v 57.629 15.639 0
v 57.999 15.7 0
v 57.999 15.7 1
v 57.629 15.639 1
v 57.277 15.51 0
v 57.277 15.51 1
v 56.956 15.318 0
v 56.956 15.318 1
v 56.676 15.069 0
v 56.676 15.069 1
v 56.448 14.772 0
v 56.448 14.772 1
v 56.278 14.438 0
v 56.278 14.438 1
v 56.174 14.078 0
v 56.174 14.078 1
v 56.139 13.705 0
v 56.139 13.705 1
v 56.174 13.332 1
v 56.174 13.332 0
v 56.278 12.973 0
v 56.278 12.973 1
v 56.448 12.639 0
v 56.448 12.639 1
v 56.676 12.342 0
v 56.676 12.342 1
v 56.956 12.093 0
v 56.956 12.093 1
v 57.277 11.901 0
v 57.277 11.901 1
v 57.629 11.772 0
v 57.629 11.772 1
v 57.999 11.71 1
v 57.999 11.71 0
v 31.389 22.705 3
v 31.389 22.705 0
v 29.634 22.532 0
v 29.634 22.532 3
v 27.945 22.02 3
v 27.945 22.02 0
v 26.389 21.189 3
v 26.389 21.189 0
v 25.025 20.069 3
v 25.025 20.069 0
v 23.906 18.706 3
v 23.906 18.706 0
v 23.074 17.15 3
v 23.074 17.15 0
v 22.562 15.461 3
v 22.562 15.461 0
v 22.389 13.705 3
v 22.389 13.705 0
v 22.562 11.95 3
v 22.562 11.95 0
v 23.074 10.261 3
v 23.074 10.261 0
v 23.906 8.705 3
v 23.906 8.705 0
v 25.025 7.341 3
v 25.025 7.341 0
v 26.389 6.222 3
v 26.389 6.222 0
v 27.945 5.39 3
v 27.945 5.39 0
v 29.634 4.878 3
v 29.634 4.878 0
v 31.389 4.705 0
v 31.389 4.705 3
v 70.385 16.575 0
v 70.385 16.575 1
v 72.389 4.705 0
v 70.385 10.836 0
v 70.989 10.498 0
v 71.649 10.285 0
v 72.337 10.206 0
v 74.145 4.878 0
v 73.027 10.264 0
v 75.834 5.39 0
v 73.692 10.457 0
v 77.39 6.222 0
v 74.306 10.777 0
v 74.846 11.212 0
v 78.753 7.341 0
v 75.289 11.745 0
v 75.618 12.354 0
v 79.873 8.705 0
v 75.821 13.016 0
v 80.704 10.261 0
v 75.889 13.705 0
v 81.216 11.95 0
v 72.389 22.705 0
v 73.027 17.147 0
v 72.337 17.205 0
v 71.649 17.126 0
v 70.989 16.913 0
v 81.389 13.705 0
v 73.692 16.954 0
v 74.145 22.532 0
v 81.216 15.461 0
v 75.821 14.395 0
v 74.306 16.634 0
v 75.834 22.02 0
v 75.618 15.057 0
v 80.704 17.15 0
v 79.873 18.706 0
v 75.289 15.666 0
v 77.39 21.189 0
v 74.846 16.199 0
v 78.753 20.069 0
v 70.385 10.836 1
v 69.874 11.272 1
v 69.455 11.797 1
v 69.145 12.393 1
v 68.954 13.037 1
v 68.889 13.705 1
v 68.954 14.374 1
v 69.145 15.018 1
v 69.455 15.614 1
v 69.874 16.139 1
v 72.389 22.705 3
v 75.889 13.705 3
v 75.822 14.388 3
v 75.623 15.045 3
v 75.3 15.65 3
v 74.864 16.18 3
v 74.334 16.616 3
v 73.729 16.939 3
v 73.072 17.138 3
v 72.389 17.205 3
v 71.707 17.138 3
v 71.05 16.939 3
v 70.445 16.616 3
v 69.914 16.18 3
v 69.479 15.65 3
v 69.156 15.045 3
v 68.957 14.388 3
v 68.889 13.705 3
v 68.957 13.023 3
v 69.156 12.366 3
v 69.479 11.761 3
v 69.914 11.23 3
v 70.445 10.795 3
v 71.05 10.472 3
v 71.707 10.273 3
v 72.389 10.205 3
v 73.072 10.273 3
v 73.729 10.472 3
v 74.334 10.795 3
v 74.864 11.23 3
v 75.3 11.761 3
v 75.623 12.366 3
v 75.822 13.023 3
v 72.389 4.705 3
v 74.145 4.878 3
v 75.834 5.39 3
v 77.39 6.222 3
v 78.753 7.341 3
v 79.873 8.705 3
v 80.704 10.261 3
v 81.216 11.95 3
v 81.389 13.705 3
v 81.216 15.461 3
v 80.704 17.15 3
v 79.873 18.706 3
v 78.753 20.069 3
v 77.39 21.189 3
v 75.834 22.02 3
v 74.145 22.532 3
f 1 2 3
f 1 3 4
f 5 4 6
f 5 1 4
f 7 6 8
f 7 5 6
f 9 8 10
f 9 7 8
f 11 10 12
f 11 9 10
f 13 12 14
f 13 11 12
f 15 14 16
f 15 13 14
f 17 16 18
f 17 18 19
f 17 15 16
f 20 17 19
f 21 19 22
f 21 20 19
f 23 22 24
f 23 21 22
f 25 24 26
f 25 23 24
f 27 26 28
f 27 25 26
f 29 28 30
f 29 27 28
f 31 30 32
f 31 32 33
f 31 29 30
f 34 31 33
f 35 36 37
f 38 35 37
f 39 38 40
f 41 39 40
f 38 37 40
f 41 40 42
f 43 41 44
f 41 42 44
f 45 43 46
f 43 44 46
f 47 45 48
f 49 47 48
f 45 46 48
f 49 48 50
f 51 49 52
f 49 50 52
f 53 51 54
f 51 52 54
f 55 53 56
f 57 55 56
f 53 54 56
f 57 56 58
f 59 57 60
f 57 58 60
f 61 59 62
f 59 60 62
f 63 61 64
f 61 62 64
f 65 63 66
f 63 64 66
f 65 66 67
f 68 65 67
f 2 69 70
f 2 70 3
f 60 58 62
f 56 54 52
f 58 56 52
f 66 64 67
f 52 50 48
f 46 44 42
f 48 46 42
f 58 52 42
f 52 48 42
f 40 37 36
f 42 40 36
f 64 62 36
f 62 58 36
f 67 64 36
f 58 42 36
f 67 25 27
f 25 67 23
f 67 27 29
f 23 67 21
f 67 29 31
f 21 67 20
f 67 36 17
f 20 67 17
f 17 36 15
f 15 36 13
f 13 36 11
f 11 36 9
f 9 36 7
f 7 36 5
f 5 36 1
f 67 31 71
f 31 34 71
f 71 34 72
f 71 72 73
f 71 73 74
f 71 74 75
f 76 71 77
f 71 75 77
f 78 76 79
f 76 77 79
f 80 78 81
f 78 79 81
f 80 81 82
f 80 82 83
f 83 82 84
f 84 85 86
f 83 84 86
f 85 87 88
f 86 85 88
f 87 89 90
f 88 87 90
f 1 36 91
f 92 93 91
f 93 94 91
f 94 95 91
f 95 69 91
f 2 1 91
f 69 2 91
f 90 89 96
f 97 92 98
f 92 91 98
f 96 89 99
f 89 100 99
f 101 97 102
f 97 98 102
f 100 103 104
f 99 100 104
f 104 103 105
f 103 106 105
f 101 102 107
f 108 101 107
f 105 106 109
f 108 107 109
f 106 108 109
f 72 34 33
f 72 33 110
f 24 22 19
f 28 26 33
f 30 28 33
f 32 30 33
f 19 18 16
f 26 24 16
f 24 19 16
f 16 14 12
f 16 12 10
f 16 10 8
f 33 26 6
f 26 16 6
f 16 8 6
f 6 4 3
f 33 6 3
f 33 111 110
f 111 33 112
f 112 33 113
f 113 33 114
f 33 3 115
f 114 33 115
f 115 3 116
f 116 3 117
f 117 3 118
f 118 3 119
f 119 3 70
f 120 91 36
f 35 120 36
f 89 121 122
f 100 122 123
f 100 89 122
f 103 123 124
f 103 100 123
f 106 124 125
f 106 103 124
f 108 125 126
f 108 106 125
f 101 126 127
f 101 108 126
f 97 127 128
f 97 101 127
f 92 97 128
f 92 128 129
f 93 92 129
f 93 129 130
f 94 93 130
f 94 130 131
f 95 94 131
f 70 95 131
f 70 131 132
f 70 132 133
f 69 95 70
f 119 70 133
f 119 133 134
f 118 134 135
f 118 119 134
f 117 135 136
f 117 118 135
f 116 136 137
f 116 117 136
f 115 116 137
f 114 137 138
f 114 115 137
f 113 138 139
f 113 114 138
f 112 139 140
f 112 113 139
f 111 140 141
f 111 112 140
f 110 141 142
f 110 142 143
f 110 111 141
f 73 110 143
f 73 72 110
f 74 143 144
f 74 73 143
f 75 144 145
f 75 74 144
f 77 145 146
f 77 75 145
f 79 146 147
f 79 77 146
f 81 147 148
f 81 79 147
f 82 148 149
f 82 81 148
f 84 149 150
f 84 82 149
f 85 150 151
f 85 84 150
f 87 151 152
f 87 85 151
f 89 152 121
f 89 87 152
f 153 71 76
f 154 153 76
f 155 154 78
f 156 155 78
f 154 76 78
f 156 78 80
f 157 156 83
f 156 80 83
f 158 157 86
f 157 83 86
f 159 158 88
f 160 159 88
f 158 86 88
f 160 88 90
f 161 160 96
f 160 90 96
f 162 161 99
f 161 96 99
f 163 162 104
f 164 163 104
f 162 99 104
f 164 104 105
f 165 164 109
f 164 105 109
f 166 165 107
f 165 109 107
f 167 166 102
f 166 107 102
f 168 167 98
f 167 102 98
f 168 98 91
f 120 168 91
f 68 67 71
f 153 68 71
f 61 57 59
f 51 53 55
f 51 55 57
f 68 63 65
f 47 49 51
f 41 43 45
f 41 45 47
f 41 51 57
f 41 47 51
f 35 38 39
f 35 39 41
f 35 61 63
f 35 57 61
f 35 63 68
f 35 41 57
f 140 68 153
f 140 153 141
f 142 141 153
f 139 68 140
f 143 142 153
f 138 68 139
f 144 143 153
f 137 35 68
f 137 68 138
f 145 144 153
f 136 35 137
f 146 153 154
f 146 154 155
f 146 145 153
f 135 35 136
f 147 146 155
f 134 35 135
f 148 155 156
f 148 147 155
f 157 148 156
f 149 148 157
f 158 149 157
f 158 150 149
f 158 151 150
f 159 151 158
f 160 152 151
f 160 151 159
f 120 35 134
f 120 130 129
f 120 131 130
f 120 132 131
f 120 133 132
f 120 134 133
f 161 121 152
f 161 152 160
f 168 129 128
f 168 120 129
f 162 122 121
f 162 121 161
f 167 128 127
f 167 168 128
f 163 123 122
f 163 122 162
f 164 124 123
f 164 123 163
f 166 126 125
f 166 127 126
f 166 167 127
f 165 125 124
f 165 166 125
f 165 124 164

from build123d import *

# Parameters (mm, degrees)
CORTE_EXTERIOR_R        = 3.500001168
SALIENTE_EXTRUIR1_DEPTH = 3
CORTAR_EXTRUIR1_DEPTH   = 1


with BuildPart() as part:
    # Corte exterior → Saliente-Extruir1 (new body)
    with BuildSketch(Plane.XY):
        with BuildLine():
            Line((31.389373952, 4.705371802), (72.389373952, 4.705371802))
            ThreePointArc((72.389373952, 4.705371802), (81.389373952, 13.705371802), (72.389373952, 22.705371802))
            Line((72.389373952, 22.705371802), (31.389373952, 22.705371802))
            ThreePointArc((31.389373952, 22.705371802), (22.389373952, 13.705371802), (31.389373952, 4.705371802))
        make_face()
        with Locations((72.389373952, 13.705371802)):
            Circle(CORTE_EXTERIOR_R, mode=Mode.SUBTRACT)
    extrude(amount=SALIENTE_EXTRUIR1_DEPTH)

    # Grabado Superficie → Cortar-Extruir1 (cut)
    with BuildSketch(Plane.XY):
        with BuildLine():
            Line((70.385171574, 16.57472382), (57.998553299, 15.700408028))
            ThreePointArc((57.998553299, 15.700408028), (56.139373952, 13.705371802), (57.998553299, 11.710335575))
            Line((57.998553299, 11.710335575), (70.385171574, 10.836019783))
            ThreePointArc((70.385171574, 10.836019783), (68.889372784, 13.705371802), (70.385171574, 16.57472382))
        make_face()
    extrude(amount=CORTAR_EXTRUIR1_DEPTH, mode=Mode.SUBTRACT)


solid = part.part
